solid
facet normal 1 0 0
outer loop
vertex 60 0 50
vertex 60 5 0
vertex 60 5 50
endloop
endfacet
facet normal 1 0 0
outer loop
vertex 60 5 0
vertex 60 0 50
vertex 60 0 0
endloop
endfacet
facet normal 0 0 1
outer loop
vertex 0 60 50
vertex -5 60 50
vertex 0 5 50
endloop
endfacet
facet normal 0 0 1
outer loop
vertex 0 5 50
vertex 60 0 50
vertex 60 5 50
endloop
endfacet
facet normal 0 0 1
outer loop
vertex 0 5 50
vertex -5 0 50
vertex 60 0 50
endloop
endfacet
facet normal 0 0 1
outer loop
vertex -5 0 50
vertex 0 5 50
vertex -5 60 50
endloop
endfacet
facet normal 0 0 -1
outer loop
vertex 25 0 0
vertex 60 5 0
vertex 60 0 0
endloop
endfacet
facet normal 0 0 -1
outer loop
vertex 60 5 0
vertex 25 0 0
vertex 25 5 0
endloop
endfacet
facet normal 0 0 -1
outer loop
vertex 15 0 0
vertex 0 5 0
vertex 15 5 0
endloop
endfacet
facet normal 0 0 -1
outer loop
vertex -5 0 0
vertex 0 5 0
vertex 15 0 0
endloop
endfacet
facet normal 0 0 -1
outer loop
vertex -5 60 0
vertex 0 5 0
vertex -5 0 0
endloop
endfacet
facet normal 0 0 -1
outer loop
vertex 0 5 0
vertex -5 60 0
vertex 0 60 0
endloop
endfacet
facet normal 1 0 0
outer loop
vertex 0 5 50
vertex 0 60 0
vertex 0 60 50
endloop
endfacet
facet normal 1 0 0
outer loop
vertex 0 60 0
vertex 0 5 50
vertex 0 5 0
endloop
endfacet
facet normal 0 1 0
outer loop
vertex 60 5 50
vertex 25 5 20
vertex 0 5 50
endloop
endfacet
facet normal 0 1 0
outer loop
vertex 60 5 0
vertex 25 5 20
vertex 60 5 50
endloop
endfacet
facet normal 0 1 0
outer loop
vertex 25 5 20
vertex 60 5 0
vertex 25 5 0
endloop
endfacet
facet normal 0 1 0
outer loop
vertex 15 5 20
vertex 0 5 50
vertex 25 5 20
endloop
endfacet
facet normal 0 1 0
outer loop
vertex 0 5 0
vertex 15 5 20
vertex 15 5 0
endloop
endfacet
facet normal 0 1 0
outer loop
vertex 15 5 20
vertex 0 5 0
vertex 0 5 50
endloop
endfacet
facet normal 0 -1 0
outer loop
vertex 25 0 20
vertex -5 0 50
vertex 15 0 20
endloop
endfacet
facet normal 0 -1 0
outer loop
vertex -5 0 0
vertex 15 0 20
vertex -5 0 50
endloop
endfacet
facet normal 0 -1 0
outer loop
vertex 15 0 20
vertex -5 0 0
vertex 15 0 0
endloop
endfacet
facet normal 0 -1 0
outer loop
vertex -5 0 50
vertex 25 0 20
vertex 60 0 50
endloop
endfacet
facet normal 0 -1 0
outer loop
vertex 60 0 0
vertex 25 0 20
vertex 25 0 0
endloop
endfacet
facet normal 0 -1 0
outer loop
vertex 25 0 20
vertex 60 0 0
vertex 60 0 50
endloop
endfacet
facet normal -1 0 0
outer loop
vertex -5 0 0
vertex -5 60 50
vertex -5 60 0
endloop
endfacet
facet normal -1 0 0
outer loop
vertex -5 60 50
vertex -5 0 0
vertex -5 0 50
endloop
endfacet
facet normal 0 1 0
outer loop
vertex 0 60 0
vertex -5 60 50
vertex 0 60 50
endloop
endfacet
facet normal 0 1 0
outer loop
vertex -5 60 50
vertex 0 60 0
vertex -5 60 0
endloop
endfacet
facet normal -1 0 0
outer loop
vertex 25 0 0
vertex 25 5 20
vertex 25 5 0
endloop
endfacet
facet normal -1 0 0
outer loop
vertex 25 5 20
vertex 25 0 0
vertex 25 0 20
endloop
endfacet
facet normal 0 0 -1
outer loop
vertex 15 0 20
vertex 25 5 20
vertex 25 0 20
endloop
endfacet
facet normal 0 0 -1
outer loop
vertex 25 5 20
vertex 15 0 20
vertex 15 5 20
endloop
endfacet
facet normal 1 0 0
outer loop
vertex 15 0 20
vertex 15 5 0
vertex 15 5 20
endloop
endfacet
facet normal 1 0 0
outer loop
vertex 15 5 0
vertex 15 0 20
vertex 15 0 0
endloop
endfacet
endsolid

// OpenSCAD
spessore=5; //da decidere se uguale per tutte oppure no
altezza=50; //uguale per tutte le pareti
lunghezza_uno=60; //lunghezza della prima parete
lunghezza_due = 40; //lunghezza della seconda parete

// la distanza della porta deve essere considerata in  relazione all'angolo tra le pareti
altezza_porta = 20; 
larghezza_porta = 10;
distanza_porta = 15;

due_pareti_porta();

module due_pareti(){
   
    cube([lunghezza_uno, spessore, altezza]);
   rotate([0,0,90])    cube([lunghezza_uno, spessore, altezza]);
    
}


module due_pareti_porta(){
    
    difference(){
        due_pareti();
        translate([15,0,0]) cube([larghezza_porta,spessore,altezza_porta]);
    }
}
